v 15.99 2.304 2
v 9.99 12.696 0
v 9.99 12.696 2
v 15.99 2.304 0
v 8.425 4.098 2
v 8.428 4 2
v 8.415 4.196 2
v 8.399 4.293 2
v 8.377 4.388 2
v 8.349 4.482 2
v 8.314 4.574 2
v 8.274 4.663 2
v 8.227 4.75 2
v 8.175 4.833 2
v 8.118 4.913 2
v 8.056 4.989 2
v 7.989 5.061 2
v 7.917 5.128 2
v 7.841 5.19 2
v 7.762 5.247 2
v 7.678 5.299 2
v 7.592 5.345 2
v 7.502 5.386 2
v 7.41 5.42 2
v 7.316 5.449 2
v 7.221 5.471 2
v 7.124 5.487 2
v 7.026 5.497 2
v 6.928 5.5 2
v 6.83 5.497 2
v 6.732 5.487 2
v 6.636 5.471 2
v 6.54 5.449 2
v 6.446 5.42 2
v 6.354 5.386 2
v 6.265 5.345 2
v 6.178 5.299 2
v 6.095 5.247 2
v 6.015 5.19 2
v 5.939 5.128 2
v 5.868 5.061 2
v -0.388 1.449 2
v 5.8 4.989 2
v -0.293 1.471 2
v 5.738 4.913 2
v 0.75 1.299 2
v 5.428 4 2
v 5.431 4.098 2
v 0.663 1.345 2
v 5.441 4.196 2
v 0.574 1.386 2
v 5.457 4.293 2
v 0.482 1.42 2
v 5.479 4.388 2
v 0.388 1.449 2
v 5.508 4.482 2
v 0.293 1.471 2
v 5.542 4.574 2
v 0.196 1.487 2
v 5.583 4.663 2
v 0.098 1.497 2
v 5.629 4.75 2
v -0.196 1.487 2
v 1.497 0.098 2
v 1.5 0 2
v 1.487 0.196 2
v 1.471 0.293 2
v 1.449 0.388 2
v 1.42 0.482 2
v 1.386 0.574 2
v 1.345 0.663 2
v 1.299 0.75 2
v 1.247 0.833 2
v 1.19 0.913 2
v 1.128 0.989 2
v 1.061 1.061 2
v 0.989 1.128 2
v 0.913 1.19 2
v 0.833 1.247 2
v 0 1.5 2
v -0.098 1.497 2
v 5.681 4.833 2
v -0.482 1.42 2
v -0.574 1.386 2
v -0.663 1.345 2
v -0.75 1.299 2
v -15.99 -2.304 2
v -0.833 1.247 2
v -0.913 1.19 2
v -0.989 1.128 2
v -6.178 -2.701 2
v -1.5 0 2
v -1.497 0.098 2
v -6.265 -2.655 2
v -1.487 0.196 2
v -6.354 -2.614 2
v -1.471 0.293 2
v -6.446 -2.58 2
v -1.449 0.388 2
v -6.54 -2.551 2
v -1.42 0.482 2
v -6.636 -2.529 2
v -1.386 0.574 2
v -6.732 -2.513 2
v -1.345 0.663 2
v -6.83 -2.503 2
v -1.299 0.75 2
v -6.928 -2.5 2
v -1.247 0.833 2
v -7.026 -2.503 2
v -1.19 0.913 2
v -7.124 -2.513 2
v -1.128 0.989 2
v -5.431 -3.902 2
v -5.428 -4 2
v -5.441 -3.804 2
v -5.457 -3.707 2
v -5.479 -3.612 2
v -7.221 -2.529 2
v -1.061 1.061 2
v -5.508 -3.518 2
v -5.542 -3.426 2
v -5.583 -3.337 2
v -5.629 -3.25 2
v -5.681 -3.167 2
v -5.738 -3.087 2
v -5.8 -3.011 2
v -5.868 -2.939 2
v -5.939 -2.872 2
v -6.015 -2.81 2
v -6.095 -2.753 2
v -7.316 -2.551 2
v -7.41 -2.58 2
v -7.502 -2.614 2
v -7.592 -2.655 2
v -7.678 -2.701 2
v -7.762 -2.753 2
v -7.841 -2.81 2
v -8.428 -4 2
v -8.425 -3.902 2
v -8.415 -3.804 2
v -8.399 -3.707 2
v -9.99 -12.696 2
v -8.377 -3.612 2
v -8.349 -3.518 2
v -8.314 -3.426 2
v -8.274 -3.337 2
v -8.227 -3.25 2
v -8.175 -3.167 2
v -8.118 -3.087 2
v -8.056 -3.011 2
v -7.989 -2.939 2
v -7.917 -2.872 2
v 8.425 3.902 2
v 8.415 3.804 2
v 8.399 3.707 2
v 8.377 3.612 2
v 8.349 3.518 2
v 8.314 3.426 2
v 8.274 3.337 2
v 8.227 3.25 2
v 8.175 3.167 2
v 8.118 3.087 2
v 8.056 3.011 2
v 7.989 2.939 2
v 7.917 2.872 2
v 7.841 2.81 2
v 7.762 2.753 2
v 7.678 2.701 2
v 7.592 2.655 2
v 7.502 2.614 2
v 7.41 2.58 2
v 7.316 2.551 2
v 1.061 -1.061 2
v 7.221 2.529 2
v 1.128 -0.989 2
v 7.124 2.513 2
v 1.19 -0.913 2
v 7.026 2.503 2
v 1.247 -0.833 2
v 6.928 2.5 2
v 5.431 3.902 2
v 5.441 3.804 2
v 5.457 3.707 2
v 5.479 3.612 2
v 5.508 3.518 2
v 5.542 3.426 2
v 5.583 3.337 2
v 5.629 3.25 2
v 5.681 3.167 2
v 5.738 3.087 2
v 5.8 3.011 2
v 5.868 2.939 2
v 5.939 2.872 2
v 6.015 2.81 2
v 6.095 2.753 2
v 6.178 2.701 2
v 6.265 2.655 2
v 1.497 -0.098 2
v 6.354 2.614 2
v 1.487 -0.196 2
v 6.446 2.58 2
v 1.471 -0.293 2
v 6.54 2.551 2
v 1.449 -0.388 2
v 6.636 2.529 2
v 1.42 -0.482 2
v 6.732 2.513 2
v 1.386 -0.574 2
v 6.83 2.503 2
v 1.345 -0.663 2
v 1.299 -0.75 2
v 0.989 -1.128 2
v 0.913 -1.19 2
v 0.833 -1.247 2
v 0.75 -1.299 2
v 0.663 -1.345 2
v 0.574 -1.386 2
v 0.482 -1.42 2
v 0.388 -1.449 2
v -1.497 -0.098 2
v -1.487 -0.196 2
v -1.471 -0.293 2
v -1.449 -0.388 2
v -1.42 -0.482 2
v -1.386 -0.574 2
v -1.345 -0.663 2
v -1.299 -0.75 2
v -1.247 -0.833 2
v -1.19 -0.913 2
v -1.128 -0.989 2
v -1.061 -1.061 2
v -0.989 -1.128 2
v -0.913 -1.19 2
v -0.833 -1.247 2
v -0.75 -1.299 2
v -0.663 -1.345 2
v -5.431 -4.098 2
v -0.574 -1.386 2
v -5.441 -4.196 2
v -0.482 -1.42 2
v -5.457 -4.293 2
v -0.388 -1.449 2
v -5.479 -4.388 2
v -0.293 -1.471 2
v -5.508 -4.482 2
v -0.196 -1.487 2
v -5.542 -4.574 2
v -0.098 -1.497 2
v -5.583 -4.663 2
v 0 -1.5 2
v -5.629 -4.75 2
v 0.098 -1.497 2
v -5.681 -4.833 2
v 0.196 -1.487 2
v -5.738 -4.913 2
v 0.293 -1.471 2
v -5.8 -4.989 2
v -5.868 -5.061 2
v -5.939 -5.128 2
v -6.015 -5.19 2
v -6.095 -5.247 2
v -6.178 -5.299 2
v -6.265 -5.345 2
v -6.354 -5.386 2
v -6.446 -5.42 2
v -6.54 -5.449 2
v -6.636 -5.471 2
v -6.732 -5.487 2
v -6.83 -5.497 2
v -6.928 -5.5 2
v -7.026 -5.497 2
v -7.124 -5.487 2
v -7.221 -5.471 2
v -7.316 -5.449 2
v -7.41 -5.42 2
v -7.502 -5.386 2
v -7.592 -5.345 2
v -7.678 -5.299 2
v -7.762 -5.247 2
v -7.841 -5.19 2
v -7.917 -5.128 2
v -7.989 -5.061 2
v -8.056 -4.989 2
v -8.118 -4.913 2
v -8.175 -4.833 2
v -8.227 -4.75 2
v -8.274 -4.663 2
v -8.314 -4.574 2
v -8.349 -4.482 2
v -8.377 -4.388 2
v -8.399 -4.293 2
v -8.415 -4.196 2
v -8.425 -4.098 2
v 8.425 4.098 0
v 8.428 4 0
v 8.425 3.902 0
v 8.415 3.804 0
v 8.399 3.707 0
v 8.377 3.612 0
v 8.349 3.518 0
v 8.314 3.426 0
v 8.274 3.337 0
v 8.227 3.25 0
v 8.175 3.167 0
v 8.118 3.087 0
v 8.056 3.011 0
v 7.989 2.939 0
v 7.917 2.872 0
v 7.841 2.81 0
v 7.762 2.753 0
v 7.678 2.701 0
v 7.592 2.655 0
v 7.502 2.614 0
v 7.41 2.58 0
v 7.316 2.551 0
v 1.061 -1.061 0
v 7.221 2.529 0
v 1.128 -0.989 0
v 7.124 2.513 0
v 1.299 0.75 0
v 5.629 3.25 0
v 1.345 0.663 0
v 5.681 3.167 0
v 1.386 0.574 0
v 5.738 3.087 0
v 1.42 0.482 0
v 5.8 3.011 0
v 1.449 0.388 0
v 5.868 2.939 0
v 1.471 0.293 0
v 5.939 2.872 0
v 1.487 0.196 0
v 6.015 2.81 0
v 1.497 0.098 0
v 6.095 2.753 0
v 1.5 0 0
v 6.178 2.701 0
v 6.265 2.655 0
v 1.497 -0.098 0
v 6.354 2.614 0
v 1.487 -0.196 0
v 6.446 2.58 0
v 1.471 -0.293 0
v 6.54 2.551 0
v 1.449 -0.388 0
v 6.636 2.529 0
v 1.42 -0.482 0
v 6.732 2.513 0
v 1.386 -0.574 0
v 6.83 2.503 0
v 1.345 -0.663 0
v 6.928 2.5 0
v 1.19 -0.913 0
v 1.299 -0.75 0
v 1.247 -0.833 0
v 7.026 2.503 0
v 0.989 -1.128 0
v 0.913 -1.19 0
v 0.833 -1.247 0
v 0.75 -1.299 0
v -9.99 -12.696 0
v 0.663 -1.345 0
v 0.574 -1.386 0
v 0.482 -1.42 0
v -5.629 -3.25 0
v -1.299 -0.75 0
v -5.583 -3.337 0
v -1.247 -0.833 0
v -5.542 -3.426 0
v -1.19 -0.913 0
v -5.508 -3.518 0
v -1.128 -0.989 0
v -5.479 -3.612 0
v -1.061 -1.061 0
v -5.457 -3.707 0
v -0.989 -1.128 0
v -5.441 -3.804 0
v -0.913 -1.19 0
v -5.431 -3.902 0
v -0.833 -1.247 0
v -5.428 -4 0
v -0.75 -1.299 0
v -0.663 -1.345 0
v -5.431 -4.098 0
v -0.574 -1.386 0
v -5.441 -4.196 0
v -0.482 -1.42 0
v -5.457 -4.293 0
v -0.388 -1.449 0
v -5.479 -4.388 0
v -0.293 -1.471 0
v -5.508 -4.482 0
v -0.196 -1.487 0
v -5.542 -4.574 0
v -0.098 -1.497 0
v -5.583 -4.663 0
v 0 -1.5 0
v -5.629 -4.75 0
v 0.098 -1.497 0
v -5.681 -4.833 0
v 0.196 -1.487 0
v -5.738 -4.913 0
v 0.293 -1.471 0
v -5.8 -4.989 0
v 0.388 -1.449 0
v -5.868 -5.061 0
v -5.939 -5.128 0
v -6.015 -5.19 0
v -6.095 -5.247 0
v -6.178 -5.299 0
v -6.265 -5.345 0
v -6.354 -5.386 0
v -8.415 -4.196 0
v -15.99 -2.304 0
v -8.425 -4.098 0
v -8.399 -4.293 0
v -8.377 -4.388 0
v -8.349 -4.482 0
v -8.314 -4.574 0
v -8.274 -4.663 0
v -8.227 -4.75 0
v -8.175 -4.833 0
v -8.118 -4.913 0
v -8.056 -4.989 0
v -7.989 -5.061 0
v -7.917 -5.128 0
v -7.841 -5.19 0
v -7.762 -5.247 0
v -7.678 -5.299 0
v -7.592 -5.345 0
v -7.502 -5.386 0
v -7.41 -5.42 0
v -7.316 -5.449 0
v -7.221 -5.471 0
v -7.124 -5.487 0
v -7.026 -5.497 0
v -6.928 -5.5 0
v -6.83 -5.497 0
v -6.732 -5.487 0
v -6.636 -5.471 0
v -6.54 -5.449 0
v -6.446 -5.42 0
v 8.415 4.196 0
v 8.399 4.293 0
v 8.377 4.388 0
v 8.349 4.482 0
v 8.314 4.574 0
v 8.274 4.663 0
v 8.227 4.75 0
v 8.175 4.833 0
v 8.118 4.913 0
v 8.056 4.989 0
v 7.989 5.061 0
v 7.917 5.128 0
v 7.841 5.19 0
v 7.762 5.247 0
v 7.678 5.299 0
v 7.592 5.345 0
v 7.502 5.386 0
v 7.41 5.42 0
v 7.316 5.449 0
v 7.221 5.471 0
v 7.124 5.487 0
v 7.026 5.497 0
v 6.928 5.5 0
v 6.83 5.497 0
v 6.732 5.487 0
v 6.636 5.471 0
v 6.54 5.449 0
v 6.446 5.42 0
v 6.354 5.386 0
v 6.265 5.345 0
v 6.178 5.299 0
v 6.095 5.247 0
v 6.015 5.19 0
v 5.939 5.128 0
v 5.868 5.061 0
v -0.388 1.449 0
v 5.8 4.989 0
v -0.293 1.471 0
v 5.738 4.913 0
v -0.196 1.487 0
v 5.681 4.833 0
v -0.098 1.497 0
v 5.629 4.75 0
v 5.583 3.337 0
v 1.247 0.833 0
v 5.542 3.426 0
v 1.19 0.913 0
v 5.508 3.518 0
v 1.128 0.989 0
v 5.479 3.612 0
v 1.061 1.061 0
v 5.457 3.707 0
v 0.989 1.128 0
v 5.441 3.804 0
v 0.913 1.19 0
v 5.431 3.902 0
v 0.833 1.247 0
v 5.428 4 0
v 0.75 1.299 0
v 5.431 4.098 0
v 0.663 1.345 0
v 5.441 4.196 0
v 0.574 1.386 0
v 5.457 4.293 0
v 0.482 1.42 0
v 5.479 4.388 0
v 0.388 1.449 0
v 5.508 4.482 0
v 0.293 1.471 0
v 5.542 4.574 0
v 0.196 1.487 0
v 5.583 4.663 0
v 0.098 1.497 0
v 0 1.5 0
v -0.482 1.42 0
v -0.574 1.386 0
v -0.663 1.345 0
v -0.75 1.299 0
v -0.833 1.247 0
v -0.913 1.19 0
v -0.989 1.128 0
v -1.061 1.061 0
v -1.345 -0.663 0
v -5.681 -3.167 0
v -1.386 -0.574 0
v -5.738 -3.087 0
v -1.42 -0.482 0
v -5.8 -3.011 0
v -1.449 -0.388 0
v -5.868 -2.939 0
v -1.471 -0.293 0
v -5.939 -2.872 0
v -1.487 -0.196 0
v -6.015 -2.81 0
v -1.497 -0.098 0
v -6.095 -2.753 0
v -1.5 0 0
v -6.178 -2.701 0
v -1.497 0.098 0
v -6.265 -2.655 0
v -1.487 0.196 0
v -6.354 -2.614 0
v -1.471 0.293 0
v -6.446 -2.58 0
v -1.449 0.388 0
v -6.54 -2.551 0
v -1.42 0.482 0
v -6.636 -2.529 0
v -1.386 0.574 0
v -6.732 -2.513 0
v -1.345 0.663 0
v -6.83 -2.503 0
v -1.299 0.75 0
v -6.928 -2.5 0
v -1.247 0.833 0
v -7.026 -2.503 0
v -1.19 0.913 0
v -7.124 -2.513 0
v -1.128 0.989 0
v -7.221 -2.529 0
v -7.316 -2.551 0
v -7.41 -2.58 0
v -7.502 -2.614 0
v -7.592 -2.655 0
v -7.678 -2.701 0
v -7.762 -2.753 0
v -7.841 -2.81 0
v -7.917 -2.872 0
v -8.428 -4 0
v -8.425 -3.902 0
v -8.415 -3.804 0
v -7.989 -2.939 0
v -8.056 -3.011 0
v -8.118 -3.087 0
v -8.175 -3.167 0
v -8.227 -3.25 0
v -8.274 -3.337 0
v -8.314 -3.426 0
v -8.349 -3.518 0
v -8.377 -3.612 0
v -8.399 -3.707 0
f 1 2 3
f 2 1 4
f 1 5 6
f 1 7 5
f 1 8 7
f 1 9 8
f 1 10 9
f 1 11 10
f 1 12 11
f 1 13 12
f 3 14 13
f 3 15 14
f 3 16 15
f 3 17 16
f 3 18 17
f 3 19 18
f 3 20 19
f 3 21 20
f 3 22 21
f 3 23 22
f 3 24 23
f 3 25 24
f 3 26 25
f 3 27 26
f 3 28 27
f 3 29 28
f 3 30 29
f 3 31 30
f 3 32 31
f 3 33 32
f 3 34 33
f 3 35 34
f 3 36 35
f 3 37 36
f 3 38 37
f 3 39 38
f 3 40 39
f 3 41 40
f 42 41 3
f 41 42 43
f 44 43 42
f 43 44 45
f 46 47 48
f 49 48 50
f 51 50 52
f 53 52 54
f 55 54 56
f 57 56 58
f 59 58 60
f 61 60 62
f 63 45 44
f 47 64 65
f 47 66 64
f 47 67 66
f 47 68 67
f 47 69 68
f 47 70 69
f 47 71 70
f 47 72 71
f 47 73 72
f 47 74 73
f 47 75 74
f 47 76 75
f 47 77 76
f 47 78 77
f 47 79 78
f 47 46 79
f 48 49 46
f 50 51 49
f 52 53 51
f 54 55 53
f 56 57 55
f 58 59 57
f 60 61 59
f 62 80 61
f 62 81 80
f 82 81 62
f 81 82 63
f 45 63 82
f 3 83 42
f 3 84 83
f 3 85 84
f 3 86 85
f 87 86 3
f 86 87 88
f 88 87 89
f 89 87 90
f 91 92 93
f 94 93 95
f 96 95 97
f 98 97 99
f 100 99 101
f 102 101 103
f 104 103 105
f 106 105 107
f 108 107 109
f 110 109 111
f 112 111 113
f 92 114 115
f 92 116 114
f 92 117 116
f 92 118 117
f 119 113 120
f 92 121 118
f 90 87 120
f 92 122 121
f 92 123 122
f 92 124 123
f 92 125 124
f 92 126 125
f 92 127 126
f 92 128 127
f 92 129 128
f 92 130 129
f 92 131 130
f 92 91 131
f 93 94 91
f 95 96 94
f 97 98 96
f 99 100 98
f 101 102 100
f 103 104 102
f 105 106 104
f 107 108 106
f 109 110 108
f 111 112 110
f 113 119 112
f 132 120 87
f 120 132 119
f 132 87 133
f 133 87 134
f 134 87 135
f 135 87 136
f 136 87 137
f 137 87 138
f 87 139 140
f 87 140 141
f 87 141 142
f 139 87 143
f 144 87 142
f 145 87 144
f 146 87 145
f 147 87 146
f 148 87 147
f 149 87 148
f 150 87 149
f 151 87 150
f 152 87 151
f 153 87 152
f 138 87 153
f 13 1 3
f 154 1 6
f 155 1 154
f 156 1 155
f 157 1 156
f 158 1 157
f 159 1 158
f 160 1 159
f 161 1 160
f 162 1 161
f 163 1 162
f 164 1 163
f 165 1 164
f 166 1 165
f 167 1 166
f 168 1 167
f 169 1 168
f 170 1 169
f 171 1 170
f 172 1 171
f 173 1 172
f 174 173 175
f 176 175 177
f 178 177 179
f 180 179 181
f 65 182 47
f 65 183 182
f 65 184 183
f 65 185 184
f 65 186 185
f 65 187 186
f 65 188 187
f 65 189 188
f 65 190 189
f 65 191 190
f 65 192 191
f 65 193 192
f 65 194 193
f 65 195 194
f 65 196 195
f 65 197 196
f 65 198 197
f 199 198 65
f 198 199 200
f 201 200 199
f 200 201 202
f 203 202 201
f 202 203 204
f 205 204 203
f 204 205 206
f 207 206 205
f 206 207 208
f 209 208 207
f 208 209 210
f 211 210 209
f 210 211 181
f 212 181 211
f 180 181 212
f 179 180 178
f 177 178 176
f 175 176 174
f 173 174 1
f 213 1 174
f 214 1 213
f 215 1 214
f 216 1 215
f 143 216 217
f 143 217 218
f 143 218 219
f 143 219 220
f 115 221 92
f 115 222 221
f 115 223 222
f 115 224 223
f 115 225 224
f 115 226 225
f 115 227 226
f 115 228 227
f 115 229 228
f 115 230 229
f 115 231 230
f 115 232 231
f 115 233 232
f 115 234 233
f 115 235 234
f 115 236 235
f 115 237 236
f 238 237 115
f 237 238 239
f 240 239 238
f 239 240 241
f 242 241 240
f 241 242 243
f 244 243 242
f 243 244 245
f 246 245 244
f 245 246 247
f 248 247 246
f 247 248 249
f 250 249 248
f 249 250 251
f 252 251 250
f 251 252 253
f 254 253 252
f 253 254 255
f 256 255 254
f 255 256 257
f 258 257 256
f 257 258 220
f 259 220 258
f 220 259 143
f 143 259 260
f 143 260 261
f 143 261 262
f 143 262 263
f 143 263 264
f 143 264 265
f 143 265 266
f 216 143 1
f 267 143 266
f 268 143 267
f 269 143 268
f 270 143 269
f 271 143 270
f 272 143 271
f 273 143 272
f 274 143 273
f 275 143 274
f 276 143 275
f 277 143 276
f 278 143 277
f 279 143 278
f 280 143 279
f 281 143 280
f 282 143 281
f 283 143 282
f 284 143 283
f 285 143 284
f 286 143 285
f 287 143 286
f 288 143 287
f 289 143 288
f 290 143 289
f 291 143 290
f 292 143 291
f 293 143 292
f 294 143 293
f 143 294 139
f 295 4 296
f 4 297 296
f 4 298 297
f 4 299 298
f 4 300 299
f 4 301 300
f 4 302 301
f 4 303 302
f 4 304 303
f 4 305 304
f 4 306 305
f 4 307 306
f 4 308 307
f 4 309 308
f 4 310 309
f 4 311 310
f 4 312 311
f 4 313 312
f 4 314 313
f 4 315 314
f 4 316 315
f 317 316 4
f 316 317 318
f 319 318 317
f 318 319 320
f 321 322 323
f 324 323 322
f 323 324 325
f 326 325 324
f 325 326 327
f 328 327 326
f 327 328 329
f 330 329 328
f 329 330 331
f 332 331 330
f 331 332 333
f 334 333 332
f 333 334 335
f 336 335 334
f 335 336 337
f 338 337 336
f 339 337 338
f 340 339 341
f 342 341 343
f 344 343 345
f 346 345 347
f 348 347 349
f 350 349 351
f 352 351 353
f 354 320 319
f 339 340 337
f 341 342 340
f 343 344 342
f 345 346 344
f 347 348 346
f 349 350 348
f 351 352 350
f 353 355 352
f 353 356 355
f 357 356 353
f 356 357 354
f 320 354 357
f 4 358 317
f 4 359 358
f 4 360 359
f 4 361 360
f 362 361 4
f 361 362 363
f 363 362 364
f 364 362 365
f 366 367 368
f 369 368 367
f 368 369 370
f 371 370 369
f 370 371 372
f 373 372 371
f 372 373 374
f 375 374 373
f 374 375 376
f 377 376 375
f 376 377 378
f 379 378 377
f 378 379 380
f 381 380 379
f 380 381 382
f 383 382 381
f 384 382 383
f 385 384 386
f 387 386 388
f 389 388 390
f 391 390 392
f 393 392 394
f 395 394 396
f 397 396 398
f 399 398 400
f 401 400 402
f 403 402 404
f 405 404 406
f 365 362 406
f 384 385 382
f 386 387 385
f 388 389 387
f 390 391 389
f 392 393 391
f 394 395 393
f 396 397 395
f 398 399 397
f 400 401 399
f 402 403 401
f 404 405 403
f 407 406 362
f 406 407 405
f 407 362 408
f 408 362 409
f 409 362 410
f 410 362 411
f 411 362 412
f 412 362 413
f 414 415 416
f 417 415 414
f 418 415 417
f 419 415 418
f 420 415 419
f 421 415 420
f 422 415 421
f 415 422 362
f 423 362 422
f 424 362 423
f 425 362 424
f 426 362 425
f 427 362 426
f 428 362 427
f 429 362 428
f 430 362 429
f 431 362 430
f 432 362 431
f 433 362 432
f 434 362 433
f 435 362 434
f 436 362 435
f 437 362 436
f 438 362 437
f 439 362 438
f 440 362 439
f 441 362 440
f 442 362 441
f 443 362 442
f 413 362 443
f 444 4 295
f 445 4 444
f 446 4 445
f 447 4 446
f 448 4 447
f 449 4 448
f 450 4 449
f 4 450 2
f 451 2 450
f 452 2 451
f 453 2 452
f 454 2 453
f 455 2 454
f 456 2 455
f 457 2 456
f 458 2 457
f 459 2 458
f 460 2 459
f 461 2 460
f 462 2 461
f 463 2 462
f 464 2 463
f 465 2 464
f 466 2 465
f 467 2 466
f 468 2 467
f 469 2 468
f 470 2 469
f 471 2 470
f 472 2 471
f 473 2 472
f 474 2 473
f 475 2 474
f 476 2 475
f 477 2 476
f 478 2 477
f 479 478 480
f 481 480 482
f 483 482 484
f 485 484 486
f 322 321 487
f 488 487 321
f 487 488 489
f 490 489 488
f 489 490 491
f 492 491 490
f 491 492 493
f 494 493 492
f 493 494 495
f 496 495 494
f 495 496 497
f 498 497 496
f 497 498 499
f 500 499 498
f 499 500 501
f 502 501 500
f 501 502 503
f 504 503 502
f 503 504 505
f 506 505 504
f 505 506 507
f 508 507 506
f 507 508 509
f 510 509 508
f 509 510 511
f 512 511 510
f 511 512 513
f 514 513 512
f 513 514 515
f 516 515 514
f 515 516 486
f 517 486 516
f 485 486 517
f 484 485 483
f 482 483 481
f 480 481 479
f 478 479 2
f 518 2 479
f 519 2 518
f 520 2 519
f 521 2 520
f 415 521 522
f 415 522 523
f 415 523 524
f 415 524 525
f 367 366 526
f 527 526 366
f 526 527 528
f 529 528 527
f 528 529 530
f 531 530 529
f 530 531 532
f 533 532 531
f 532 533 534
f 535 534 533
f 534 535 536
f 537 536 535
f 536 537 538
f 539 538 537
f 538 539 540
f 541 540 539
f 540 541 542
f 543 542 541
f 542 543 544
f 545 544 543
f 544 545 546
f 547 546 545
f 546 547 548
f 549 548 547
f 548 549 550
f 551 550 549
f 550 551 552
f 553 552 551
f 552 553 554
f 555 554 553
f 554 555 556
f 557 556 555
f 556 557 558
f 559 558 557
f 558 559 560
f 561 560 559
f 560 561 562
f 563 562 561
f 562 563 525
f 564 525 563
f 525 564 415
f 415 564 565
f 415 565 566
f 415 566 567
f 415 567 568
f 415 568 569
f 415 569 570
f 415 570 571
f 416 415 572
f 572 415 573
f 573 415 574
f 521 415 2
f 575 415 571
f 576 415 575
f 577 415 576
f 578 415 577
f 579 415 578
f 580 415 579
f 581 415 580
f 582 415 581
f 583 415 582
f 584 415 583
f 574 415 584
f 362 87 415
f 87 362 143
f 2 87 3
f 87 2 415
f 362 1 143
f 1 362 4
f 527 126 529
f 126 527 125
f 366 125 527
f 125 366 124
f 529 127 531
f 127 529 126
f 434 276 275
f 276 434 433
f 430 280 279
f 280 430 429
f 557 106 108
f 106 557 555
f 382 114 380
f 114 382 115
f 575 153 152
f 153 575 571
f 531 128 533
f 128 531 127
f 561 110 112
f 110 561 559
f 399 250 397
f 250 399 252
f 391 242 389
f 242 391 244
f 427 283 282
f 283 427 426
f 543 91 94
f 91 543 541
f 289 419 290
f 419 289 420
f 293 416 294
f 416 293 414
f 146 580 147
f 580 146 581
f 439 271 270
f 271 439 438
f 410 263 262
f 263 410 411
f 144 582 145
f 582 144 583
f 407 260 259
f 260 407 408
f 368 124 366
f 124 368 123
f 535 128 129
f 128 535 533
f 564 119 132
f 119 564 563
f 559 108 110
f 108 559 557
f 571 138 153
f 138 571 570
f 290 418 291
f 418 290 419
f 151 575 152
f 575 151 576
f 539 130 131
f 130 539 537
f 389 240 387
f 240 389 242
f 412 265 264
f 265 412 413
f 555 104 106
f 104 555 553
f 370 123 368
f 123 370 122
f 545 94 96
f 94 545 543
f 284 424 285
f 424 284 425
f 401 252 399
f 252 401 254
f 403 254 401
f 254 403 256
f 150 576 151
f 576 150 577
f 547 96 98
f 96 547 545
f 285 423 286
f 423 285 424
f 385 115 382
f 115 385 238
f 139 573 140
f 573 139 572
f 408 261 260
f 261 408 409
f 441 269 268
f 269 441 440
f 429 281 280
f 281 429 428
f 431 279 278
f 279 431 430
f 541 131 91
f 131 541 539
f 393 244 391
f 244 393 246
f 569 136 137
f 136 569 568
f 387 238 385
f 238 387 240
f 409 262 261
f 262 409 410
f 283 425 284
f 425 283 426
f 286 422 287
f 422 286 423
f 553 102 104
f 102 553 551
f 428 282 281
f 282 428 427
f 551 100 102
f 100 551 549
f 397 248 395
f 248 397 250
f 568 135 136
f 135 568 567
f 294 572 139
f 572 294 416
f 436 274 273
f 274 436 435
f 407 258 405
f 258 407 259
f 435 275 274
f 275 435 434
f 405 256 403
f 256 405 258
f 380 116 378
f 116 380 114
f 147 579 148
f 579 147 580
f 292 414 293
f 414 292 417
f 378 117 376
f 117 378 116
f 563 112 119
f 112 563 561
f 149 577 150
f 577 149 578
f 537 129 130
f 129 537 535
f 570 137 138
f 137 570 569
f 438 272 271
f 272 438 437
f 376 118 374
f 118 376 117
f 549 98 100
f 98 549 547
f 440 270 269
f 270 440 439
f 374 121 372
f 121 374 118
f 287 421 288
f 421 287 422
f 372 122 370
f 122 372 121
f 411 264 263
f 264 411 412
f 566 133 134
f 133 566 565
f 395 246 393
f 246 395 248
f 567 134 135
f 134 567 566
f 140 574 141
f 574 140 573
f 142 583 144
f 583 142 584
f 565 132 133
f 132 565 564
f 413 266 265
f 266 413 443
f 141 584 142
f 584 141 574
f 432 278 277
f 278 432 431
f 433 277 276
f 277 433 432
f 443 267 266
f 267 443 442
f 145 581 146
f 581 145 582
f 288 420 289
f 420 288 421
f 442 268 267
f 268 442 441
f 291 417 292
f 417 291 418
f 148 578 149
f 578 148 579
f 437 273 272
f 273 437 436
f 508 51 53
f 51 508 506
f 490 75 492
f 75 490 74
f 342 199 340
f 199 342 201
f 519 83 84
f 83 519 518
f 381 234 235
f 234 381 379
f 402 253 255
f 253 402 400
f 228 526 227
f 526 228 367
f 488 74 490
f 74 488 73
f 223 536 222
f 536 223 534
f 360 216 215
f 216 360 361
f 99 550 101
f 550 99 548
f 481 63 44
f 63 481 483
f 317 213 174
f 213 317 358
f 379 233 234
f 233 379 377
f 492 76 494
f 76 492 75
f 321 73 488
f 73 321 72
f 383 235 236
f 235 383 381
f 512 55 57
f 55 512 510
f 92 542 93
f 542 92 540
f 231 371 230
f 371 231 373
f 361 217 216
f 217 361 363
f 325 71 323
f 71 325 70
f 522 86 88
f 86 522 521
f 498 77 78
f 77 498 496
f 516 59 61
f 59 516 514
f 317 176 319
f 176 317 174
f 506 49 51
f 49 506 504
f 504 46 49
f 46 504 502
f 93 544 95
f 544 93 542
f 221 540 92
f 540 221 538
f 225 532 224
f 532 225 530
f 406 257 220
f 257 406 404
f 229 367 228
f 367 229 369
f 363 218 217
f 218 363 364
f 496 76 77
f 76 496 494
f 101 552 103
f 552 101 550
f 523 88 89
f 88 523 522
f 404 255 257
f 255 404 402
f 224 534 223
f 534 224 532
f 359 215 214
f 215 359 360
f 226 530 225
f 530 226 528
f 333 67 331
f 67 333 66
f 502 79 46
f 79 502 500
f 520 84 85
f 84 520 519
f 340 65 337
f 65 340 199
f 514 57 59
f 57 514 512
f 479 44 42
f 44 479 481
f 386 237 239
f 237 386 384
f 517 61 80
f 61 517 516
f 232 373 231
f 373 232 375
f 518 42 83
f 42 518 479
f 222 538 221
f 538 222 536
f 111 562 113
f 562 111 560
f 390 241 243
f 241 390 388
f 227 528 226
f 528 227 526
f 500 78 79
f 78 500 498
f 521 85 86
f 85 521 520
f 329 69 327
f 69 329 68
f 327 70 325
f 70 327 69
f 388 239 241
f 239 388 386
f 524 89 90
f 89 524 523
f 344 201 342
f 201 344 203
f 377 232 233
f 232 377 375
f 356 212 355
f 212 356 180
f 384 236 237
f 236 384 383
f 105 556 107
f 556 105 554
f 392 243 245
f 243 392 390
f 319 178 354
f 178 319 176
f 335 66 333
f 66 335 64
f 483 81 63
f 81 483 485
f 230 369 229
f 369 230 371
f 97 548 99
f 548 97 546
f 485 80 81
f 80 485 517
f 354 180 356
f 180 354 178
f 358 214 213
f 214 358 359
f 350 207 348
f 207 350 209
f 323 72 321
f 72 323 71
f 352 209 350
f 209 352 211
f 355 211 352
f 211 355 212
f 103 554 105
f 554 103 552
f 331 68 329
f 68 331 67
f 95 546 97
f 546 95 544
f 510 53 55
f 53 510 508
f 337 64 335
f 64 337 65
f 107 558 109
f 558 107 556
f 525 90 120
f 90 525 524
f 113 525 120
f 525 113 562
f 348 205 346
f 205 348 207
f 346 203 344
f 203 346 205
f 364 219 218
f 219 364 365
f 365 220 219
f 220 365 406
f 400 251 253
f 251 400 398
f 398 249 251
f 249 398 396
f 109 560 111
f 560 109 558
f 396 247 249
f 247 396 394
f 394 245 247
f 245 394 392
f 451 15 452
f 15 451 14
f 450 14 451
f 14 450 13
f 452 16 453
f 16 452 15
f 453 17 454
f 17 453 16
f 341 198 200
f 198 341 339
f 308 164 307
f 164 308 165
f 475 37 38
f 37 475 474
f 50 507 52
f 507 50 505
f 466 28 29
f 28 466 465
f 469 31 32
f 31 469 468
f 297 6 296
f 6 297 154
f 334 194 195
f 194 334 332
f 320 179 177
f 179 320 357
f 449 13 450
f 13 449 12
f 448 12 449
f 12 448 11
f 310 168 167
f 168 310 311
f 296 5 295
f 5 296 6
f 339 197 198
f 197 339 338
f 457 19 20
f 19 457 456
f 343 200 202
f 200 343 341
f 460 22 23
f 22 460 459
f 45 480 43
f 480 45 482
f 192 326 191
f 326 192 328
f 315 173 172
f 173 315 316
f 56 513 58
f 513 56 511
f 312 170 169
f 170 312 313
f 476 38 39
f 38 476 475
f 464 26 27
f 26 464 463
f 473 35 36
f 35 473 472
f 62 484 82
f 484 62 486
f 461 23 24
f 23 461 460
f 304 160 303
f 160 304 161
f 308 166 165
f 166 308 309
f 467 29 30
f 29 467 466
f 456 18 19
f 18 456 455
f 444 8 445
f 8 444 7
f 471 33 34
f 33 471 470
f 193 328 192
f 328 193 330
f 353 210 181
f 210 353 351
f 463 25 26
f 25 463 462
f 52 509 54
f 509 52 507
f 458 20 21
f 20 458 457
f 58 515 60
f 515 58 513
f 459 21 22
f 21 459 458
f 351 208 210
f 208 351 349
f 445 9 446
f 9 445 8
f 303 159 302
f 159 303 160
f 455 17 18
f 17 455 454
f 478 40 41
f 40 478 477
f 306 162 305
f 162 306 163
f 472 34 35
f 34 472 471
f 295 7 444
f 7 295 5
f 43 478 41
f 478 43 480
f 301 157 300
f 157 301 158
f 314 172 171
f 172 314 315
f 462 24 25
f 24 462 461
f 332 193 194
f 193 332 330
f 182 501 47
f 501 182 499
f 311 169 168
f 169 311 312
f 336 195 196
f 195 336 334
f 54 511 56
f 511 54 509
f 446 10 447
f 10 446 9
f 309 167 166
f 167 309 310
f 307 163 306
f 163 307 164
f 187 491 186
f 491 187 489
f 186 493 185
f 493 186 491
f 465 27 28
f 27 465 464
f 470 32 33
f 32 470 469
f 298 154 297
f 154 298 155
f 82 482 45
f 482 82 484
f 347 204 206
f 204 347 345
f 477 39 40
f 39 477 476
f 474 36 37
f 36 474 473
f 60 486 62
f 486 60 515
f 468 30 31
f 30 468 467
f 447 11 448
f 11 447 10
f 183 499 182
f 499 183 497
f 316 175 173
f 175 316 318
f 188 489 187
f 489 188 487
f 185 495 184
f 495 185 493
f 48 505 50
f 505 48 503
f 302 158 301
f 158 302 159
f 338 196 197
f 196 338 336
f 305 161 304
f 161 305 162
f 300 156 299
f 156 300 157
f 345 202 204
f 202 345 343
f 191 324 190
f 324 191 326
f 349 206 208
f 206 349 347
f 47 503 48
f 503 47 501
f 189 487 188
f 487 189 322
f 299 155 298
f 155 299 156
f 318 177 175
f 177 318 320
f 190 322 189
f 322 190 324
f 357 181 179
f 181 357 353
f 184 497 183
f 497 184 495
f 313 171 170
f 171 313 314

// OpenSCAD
// Auto-generated from tests/data/feature_fixtures_manifest.json
// fixture: plate_rotated_z30_with_linear_pattern
// fixture_type: plate
// description: Plate rotated 30° around Z with three equally-spaced holes forming a linear pattern. Validates rotated-plate local-frame pattern detection.
// transform: rotate=[0.000000, 0.000000, 30.000000], translate=[0.000000, 0.000000, 0.000000]
$fn = 96;

plate_size = [30.000000, 12.000000, 2.000000];
plate_origin = [-15.000000, -6.000000, 0.000000];

module through_hole(center, diameter, height) {
  translate(center) cylinder(d=diameter, h=height, center=false);
}

module through_slot(start, end, width, height) {
  hull() {
    through_hole(start, width, height);
    through_hole(end, width, height);
  }
}

module counterbore_hole(center, through_d, bore_d, bore_depth, plate_thickness) {
  translate([center[0], center[1], -0.1])
    cylinder(d=through_d, h=plate_thickness + 0.2, center=false);
  translate([center[0], center[1], plate_thickness - bore_depth])
    cylinder(d=bore_d, h=bore_depth + 0.1, center=false);
}

translate([0.000000, 0.000000, 0.000000])
rotate([0.000000, 0.000000, 30.000000]) {
difference() {
  translate(plate_origin) cube(plate_size);
  through_hole([-8.000000, 0.000000, -0.100000], 3.000000, 2.200000);  // hole_0
  through_hole([0.000000, 0.000000, -0.100000], 3.000000, 2.200000);  // hole_1
  through_hole([8.000000, 0.000000, -0.100000], 3.000000, 2.200000);  // hole_2
}
}
